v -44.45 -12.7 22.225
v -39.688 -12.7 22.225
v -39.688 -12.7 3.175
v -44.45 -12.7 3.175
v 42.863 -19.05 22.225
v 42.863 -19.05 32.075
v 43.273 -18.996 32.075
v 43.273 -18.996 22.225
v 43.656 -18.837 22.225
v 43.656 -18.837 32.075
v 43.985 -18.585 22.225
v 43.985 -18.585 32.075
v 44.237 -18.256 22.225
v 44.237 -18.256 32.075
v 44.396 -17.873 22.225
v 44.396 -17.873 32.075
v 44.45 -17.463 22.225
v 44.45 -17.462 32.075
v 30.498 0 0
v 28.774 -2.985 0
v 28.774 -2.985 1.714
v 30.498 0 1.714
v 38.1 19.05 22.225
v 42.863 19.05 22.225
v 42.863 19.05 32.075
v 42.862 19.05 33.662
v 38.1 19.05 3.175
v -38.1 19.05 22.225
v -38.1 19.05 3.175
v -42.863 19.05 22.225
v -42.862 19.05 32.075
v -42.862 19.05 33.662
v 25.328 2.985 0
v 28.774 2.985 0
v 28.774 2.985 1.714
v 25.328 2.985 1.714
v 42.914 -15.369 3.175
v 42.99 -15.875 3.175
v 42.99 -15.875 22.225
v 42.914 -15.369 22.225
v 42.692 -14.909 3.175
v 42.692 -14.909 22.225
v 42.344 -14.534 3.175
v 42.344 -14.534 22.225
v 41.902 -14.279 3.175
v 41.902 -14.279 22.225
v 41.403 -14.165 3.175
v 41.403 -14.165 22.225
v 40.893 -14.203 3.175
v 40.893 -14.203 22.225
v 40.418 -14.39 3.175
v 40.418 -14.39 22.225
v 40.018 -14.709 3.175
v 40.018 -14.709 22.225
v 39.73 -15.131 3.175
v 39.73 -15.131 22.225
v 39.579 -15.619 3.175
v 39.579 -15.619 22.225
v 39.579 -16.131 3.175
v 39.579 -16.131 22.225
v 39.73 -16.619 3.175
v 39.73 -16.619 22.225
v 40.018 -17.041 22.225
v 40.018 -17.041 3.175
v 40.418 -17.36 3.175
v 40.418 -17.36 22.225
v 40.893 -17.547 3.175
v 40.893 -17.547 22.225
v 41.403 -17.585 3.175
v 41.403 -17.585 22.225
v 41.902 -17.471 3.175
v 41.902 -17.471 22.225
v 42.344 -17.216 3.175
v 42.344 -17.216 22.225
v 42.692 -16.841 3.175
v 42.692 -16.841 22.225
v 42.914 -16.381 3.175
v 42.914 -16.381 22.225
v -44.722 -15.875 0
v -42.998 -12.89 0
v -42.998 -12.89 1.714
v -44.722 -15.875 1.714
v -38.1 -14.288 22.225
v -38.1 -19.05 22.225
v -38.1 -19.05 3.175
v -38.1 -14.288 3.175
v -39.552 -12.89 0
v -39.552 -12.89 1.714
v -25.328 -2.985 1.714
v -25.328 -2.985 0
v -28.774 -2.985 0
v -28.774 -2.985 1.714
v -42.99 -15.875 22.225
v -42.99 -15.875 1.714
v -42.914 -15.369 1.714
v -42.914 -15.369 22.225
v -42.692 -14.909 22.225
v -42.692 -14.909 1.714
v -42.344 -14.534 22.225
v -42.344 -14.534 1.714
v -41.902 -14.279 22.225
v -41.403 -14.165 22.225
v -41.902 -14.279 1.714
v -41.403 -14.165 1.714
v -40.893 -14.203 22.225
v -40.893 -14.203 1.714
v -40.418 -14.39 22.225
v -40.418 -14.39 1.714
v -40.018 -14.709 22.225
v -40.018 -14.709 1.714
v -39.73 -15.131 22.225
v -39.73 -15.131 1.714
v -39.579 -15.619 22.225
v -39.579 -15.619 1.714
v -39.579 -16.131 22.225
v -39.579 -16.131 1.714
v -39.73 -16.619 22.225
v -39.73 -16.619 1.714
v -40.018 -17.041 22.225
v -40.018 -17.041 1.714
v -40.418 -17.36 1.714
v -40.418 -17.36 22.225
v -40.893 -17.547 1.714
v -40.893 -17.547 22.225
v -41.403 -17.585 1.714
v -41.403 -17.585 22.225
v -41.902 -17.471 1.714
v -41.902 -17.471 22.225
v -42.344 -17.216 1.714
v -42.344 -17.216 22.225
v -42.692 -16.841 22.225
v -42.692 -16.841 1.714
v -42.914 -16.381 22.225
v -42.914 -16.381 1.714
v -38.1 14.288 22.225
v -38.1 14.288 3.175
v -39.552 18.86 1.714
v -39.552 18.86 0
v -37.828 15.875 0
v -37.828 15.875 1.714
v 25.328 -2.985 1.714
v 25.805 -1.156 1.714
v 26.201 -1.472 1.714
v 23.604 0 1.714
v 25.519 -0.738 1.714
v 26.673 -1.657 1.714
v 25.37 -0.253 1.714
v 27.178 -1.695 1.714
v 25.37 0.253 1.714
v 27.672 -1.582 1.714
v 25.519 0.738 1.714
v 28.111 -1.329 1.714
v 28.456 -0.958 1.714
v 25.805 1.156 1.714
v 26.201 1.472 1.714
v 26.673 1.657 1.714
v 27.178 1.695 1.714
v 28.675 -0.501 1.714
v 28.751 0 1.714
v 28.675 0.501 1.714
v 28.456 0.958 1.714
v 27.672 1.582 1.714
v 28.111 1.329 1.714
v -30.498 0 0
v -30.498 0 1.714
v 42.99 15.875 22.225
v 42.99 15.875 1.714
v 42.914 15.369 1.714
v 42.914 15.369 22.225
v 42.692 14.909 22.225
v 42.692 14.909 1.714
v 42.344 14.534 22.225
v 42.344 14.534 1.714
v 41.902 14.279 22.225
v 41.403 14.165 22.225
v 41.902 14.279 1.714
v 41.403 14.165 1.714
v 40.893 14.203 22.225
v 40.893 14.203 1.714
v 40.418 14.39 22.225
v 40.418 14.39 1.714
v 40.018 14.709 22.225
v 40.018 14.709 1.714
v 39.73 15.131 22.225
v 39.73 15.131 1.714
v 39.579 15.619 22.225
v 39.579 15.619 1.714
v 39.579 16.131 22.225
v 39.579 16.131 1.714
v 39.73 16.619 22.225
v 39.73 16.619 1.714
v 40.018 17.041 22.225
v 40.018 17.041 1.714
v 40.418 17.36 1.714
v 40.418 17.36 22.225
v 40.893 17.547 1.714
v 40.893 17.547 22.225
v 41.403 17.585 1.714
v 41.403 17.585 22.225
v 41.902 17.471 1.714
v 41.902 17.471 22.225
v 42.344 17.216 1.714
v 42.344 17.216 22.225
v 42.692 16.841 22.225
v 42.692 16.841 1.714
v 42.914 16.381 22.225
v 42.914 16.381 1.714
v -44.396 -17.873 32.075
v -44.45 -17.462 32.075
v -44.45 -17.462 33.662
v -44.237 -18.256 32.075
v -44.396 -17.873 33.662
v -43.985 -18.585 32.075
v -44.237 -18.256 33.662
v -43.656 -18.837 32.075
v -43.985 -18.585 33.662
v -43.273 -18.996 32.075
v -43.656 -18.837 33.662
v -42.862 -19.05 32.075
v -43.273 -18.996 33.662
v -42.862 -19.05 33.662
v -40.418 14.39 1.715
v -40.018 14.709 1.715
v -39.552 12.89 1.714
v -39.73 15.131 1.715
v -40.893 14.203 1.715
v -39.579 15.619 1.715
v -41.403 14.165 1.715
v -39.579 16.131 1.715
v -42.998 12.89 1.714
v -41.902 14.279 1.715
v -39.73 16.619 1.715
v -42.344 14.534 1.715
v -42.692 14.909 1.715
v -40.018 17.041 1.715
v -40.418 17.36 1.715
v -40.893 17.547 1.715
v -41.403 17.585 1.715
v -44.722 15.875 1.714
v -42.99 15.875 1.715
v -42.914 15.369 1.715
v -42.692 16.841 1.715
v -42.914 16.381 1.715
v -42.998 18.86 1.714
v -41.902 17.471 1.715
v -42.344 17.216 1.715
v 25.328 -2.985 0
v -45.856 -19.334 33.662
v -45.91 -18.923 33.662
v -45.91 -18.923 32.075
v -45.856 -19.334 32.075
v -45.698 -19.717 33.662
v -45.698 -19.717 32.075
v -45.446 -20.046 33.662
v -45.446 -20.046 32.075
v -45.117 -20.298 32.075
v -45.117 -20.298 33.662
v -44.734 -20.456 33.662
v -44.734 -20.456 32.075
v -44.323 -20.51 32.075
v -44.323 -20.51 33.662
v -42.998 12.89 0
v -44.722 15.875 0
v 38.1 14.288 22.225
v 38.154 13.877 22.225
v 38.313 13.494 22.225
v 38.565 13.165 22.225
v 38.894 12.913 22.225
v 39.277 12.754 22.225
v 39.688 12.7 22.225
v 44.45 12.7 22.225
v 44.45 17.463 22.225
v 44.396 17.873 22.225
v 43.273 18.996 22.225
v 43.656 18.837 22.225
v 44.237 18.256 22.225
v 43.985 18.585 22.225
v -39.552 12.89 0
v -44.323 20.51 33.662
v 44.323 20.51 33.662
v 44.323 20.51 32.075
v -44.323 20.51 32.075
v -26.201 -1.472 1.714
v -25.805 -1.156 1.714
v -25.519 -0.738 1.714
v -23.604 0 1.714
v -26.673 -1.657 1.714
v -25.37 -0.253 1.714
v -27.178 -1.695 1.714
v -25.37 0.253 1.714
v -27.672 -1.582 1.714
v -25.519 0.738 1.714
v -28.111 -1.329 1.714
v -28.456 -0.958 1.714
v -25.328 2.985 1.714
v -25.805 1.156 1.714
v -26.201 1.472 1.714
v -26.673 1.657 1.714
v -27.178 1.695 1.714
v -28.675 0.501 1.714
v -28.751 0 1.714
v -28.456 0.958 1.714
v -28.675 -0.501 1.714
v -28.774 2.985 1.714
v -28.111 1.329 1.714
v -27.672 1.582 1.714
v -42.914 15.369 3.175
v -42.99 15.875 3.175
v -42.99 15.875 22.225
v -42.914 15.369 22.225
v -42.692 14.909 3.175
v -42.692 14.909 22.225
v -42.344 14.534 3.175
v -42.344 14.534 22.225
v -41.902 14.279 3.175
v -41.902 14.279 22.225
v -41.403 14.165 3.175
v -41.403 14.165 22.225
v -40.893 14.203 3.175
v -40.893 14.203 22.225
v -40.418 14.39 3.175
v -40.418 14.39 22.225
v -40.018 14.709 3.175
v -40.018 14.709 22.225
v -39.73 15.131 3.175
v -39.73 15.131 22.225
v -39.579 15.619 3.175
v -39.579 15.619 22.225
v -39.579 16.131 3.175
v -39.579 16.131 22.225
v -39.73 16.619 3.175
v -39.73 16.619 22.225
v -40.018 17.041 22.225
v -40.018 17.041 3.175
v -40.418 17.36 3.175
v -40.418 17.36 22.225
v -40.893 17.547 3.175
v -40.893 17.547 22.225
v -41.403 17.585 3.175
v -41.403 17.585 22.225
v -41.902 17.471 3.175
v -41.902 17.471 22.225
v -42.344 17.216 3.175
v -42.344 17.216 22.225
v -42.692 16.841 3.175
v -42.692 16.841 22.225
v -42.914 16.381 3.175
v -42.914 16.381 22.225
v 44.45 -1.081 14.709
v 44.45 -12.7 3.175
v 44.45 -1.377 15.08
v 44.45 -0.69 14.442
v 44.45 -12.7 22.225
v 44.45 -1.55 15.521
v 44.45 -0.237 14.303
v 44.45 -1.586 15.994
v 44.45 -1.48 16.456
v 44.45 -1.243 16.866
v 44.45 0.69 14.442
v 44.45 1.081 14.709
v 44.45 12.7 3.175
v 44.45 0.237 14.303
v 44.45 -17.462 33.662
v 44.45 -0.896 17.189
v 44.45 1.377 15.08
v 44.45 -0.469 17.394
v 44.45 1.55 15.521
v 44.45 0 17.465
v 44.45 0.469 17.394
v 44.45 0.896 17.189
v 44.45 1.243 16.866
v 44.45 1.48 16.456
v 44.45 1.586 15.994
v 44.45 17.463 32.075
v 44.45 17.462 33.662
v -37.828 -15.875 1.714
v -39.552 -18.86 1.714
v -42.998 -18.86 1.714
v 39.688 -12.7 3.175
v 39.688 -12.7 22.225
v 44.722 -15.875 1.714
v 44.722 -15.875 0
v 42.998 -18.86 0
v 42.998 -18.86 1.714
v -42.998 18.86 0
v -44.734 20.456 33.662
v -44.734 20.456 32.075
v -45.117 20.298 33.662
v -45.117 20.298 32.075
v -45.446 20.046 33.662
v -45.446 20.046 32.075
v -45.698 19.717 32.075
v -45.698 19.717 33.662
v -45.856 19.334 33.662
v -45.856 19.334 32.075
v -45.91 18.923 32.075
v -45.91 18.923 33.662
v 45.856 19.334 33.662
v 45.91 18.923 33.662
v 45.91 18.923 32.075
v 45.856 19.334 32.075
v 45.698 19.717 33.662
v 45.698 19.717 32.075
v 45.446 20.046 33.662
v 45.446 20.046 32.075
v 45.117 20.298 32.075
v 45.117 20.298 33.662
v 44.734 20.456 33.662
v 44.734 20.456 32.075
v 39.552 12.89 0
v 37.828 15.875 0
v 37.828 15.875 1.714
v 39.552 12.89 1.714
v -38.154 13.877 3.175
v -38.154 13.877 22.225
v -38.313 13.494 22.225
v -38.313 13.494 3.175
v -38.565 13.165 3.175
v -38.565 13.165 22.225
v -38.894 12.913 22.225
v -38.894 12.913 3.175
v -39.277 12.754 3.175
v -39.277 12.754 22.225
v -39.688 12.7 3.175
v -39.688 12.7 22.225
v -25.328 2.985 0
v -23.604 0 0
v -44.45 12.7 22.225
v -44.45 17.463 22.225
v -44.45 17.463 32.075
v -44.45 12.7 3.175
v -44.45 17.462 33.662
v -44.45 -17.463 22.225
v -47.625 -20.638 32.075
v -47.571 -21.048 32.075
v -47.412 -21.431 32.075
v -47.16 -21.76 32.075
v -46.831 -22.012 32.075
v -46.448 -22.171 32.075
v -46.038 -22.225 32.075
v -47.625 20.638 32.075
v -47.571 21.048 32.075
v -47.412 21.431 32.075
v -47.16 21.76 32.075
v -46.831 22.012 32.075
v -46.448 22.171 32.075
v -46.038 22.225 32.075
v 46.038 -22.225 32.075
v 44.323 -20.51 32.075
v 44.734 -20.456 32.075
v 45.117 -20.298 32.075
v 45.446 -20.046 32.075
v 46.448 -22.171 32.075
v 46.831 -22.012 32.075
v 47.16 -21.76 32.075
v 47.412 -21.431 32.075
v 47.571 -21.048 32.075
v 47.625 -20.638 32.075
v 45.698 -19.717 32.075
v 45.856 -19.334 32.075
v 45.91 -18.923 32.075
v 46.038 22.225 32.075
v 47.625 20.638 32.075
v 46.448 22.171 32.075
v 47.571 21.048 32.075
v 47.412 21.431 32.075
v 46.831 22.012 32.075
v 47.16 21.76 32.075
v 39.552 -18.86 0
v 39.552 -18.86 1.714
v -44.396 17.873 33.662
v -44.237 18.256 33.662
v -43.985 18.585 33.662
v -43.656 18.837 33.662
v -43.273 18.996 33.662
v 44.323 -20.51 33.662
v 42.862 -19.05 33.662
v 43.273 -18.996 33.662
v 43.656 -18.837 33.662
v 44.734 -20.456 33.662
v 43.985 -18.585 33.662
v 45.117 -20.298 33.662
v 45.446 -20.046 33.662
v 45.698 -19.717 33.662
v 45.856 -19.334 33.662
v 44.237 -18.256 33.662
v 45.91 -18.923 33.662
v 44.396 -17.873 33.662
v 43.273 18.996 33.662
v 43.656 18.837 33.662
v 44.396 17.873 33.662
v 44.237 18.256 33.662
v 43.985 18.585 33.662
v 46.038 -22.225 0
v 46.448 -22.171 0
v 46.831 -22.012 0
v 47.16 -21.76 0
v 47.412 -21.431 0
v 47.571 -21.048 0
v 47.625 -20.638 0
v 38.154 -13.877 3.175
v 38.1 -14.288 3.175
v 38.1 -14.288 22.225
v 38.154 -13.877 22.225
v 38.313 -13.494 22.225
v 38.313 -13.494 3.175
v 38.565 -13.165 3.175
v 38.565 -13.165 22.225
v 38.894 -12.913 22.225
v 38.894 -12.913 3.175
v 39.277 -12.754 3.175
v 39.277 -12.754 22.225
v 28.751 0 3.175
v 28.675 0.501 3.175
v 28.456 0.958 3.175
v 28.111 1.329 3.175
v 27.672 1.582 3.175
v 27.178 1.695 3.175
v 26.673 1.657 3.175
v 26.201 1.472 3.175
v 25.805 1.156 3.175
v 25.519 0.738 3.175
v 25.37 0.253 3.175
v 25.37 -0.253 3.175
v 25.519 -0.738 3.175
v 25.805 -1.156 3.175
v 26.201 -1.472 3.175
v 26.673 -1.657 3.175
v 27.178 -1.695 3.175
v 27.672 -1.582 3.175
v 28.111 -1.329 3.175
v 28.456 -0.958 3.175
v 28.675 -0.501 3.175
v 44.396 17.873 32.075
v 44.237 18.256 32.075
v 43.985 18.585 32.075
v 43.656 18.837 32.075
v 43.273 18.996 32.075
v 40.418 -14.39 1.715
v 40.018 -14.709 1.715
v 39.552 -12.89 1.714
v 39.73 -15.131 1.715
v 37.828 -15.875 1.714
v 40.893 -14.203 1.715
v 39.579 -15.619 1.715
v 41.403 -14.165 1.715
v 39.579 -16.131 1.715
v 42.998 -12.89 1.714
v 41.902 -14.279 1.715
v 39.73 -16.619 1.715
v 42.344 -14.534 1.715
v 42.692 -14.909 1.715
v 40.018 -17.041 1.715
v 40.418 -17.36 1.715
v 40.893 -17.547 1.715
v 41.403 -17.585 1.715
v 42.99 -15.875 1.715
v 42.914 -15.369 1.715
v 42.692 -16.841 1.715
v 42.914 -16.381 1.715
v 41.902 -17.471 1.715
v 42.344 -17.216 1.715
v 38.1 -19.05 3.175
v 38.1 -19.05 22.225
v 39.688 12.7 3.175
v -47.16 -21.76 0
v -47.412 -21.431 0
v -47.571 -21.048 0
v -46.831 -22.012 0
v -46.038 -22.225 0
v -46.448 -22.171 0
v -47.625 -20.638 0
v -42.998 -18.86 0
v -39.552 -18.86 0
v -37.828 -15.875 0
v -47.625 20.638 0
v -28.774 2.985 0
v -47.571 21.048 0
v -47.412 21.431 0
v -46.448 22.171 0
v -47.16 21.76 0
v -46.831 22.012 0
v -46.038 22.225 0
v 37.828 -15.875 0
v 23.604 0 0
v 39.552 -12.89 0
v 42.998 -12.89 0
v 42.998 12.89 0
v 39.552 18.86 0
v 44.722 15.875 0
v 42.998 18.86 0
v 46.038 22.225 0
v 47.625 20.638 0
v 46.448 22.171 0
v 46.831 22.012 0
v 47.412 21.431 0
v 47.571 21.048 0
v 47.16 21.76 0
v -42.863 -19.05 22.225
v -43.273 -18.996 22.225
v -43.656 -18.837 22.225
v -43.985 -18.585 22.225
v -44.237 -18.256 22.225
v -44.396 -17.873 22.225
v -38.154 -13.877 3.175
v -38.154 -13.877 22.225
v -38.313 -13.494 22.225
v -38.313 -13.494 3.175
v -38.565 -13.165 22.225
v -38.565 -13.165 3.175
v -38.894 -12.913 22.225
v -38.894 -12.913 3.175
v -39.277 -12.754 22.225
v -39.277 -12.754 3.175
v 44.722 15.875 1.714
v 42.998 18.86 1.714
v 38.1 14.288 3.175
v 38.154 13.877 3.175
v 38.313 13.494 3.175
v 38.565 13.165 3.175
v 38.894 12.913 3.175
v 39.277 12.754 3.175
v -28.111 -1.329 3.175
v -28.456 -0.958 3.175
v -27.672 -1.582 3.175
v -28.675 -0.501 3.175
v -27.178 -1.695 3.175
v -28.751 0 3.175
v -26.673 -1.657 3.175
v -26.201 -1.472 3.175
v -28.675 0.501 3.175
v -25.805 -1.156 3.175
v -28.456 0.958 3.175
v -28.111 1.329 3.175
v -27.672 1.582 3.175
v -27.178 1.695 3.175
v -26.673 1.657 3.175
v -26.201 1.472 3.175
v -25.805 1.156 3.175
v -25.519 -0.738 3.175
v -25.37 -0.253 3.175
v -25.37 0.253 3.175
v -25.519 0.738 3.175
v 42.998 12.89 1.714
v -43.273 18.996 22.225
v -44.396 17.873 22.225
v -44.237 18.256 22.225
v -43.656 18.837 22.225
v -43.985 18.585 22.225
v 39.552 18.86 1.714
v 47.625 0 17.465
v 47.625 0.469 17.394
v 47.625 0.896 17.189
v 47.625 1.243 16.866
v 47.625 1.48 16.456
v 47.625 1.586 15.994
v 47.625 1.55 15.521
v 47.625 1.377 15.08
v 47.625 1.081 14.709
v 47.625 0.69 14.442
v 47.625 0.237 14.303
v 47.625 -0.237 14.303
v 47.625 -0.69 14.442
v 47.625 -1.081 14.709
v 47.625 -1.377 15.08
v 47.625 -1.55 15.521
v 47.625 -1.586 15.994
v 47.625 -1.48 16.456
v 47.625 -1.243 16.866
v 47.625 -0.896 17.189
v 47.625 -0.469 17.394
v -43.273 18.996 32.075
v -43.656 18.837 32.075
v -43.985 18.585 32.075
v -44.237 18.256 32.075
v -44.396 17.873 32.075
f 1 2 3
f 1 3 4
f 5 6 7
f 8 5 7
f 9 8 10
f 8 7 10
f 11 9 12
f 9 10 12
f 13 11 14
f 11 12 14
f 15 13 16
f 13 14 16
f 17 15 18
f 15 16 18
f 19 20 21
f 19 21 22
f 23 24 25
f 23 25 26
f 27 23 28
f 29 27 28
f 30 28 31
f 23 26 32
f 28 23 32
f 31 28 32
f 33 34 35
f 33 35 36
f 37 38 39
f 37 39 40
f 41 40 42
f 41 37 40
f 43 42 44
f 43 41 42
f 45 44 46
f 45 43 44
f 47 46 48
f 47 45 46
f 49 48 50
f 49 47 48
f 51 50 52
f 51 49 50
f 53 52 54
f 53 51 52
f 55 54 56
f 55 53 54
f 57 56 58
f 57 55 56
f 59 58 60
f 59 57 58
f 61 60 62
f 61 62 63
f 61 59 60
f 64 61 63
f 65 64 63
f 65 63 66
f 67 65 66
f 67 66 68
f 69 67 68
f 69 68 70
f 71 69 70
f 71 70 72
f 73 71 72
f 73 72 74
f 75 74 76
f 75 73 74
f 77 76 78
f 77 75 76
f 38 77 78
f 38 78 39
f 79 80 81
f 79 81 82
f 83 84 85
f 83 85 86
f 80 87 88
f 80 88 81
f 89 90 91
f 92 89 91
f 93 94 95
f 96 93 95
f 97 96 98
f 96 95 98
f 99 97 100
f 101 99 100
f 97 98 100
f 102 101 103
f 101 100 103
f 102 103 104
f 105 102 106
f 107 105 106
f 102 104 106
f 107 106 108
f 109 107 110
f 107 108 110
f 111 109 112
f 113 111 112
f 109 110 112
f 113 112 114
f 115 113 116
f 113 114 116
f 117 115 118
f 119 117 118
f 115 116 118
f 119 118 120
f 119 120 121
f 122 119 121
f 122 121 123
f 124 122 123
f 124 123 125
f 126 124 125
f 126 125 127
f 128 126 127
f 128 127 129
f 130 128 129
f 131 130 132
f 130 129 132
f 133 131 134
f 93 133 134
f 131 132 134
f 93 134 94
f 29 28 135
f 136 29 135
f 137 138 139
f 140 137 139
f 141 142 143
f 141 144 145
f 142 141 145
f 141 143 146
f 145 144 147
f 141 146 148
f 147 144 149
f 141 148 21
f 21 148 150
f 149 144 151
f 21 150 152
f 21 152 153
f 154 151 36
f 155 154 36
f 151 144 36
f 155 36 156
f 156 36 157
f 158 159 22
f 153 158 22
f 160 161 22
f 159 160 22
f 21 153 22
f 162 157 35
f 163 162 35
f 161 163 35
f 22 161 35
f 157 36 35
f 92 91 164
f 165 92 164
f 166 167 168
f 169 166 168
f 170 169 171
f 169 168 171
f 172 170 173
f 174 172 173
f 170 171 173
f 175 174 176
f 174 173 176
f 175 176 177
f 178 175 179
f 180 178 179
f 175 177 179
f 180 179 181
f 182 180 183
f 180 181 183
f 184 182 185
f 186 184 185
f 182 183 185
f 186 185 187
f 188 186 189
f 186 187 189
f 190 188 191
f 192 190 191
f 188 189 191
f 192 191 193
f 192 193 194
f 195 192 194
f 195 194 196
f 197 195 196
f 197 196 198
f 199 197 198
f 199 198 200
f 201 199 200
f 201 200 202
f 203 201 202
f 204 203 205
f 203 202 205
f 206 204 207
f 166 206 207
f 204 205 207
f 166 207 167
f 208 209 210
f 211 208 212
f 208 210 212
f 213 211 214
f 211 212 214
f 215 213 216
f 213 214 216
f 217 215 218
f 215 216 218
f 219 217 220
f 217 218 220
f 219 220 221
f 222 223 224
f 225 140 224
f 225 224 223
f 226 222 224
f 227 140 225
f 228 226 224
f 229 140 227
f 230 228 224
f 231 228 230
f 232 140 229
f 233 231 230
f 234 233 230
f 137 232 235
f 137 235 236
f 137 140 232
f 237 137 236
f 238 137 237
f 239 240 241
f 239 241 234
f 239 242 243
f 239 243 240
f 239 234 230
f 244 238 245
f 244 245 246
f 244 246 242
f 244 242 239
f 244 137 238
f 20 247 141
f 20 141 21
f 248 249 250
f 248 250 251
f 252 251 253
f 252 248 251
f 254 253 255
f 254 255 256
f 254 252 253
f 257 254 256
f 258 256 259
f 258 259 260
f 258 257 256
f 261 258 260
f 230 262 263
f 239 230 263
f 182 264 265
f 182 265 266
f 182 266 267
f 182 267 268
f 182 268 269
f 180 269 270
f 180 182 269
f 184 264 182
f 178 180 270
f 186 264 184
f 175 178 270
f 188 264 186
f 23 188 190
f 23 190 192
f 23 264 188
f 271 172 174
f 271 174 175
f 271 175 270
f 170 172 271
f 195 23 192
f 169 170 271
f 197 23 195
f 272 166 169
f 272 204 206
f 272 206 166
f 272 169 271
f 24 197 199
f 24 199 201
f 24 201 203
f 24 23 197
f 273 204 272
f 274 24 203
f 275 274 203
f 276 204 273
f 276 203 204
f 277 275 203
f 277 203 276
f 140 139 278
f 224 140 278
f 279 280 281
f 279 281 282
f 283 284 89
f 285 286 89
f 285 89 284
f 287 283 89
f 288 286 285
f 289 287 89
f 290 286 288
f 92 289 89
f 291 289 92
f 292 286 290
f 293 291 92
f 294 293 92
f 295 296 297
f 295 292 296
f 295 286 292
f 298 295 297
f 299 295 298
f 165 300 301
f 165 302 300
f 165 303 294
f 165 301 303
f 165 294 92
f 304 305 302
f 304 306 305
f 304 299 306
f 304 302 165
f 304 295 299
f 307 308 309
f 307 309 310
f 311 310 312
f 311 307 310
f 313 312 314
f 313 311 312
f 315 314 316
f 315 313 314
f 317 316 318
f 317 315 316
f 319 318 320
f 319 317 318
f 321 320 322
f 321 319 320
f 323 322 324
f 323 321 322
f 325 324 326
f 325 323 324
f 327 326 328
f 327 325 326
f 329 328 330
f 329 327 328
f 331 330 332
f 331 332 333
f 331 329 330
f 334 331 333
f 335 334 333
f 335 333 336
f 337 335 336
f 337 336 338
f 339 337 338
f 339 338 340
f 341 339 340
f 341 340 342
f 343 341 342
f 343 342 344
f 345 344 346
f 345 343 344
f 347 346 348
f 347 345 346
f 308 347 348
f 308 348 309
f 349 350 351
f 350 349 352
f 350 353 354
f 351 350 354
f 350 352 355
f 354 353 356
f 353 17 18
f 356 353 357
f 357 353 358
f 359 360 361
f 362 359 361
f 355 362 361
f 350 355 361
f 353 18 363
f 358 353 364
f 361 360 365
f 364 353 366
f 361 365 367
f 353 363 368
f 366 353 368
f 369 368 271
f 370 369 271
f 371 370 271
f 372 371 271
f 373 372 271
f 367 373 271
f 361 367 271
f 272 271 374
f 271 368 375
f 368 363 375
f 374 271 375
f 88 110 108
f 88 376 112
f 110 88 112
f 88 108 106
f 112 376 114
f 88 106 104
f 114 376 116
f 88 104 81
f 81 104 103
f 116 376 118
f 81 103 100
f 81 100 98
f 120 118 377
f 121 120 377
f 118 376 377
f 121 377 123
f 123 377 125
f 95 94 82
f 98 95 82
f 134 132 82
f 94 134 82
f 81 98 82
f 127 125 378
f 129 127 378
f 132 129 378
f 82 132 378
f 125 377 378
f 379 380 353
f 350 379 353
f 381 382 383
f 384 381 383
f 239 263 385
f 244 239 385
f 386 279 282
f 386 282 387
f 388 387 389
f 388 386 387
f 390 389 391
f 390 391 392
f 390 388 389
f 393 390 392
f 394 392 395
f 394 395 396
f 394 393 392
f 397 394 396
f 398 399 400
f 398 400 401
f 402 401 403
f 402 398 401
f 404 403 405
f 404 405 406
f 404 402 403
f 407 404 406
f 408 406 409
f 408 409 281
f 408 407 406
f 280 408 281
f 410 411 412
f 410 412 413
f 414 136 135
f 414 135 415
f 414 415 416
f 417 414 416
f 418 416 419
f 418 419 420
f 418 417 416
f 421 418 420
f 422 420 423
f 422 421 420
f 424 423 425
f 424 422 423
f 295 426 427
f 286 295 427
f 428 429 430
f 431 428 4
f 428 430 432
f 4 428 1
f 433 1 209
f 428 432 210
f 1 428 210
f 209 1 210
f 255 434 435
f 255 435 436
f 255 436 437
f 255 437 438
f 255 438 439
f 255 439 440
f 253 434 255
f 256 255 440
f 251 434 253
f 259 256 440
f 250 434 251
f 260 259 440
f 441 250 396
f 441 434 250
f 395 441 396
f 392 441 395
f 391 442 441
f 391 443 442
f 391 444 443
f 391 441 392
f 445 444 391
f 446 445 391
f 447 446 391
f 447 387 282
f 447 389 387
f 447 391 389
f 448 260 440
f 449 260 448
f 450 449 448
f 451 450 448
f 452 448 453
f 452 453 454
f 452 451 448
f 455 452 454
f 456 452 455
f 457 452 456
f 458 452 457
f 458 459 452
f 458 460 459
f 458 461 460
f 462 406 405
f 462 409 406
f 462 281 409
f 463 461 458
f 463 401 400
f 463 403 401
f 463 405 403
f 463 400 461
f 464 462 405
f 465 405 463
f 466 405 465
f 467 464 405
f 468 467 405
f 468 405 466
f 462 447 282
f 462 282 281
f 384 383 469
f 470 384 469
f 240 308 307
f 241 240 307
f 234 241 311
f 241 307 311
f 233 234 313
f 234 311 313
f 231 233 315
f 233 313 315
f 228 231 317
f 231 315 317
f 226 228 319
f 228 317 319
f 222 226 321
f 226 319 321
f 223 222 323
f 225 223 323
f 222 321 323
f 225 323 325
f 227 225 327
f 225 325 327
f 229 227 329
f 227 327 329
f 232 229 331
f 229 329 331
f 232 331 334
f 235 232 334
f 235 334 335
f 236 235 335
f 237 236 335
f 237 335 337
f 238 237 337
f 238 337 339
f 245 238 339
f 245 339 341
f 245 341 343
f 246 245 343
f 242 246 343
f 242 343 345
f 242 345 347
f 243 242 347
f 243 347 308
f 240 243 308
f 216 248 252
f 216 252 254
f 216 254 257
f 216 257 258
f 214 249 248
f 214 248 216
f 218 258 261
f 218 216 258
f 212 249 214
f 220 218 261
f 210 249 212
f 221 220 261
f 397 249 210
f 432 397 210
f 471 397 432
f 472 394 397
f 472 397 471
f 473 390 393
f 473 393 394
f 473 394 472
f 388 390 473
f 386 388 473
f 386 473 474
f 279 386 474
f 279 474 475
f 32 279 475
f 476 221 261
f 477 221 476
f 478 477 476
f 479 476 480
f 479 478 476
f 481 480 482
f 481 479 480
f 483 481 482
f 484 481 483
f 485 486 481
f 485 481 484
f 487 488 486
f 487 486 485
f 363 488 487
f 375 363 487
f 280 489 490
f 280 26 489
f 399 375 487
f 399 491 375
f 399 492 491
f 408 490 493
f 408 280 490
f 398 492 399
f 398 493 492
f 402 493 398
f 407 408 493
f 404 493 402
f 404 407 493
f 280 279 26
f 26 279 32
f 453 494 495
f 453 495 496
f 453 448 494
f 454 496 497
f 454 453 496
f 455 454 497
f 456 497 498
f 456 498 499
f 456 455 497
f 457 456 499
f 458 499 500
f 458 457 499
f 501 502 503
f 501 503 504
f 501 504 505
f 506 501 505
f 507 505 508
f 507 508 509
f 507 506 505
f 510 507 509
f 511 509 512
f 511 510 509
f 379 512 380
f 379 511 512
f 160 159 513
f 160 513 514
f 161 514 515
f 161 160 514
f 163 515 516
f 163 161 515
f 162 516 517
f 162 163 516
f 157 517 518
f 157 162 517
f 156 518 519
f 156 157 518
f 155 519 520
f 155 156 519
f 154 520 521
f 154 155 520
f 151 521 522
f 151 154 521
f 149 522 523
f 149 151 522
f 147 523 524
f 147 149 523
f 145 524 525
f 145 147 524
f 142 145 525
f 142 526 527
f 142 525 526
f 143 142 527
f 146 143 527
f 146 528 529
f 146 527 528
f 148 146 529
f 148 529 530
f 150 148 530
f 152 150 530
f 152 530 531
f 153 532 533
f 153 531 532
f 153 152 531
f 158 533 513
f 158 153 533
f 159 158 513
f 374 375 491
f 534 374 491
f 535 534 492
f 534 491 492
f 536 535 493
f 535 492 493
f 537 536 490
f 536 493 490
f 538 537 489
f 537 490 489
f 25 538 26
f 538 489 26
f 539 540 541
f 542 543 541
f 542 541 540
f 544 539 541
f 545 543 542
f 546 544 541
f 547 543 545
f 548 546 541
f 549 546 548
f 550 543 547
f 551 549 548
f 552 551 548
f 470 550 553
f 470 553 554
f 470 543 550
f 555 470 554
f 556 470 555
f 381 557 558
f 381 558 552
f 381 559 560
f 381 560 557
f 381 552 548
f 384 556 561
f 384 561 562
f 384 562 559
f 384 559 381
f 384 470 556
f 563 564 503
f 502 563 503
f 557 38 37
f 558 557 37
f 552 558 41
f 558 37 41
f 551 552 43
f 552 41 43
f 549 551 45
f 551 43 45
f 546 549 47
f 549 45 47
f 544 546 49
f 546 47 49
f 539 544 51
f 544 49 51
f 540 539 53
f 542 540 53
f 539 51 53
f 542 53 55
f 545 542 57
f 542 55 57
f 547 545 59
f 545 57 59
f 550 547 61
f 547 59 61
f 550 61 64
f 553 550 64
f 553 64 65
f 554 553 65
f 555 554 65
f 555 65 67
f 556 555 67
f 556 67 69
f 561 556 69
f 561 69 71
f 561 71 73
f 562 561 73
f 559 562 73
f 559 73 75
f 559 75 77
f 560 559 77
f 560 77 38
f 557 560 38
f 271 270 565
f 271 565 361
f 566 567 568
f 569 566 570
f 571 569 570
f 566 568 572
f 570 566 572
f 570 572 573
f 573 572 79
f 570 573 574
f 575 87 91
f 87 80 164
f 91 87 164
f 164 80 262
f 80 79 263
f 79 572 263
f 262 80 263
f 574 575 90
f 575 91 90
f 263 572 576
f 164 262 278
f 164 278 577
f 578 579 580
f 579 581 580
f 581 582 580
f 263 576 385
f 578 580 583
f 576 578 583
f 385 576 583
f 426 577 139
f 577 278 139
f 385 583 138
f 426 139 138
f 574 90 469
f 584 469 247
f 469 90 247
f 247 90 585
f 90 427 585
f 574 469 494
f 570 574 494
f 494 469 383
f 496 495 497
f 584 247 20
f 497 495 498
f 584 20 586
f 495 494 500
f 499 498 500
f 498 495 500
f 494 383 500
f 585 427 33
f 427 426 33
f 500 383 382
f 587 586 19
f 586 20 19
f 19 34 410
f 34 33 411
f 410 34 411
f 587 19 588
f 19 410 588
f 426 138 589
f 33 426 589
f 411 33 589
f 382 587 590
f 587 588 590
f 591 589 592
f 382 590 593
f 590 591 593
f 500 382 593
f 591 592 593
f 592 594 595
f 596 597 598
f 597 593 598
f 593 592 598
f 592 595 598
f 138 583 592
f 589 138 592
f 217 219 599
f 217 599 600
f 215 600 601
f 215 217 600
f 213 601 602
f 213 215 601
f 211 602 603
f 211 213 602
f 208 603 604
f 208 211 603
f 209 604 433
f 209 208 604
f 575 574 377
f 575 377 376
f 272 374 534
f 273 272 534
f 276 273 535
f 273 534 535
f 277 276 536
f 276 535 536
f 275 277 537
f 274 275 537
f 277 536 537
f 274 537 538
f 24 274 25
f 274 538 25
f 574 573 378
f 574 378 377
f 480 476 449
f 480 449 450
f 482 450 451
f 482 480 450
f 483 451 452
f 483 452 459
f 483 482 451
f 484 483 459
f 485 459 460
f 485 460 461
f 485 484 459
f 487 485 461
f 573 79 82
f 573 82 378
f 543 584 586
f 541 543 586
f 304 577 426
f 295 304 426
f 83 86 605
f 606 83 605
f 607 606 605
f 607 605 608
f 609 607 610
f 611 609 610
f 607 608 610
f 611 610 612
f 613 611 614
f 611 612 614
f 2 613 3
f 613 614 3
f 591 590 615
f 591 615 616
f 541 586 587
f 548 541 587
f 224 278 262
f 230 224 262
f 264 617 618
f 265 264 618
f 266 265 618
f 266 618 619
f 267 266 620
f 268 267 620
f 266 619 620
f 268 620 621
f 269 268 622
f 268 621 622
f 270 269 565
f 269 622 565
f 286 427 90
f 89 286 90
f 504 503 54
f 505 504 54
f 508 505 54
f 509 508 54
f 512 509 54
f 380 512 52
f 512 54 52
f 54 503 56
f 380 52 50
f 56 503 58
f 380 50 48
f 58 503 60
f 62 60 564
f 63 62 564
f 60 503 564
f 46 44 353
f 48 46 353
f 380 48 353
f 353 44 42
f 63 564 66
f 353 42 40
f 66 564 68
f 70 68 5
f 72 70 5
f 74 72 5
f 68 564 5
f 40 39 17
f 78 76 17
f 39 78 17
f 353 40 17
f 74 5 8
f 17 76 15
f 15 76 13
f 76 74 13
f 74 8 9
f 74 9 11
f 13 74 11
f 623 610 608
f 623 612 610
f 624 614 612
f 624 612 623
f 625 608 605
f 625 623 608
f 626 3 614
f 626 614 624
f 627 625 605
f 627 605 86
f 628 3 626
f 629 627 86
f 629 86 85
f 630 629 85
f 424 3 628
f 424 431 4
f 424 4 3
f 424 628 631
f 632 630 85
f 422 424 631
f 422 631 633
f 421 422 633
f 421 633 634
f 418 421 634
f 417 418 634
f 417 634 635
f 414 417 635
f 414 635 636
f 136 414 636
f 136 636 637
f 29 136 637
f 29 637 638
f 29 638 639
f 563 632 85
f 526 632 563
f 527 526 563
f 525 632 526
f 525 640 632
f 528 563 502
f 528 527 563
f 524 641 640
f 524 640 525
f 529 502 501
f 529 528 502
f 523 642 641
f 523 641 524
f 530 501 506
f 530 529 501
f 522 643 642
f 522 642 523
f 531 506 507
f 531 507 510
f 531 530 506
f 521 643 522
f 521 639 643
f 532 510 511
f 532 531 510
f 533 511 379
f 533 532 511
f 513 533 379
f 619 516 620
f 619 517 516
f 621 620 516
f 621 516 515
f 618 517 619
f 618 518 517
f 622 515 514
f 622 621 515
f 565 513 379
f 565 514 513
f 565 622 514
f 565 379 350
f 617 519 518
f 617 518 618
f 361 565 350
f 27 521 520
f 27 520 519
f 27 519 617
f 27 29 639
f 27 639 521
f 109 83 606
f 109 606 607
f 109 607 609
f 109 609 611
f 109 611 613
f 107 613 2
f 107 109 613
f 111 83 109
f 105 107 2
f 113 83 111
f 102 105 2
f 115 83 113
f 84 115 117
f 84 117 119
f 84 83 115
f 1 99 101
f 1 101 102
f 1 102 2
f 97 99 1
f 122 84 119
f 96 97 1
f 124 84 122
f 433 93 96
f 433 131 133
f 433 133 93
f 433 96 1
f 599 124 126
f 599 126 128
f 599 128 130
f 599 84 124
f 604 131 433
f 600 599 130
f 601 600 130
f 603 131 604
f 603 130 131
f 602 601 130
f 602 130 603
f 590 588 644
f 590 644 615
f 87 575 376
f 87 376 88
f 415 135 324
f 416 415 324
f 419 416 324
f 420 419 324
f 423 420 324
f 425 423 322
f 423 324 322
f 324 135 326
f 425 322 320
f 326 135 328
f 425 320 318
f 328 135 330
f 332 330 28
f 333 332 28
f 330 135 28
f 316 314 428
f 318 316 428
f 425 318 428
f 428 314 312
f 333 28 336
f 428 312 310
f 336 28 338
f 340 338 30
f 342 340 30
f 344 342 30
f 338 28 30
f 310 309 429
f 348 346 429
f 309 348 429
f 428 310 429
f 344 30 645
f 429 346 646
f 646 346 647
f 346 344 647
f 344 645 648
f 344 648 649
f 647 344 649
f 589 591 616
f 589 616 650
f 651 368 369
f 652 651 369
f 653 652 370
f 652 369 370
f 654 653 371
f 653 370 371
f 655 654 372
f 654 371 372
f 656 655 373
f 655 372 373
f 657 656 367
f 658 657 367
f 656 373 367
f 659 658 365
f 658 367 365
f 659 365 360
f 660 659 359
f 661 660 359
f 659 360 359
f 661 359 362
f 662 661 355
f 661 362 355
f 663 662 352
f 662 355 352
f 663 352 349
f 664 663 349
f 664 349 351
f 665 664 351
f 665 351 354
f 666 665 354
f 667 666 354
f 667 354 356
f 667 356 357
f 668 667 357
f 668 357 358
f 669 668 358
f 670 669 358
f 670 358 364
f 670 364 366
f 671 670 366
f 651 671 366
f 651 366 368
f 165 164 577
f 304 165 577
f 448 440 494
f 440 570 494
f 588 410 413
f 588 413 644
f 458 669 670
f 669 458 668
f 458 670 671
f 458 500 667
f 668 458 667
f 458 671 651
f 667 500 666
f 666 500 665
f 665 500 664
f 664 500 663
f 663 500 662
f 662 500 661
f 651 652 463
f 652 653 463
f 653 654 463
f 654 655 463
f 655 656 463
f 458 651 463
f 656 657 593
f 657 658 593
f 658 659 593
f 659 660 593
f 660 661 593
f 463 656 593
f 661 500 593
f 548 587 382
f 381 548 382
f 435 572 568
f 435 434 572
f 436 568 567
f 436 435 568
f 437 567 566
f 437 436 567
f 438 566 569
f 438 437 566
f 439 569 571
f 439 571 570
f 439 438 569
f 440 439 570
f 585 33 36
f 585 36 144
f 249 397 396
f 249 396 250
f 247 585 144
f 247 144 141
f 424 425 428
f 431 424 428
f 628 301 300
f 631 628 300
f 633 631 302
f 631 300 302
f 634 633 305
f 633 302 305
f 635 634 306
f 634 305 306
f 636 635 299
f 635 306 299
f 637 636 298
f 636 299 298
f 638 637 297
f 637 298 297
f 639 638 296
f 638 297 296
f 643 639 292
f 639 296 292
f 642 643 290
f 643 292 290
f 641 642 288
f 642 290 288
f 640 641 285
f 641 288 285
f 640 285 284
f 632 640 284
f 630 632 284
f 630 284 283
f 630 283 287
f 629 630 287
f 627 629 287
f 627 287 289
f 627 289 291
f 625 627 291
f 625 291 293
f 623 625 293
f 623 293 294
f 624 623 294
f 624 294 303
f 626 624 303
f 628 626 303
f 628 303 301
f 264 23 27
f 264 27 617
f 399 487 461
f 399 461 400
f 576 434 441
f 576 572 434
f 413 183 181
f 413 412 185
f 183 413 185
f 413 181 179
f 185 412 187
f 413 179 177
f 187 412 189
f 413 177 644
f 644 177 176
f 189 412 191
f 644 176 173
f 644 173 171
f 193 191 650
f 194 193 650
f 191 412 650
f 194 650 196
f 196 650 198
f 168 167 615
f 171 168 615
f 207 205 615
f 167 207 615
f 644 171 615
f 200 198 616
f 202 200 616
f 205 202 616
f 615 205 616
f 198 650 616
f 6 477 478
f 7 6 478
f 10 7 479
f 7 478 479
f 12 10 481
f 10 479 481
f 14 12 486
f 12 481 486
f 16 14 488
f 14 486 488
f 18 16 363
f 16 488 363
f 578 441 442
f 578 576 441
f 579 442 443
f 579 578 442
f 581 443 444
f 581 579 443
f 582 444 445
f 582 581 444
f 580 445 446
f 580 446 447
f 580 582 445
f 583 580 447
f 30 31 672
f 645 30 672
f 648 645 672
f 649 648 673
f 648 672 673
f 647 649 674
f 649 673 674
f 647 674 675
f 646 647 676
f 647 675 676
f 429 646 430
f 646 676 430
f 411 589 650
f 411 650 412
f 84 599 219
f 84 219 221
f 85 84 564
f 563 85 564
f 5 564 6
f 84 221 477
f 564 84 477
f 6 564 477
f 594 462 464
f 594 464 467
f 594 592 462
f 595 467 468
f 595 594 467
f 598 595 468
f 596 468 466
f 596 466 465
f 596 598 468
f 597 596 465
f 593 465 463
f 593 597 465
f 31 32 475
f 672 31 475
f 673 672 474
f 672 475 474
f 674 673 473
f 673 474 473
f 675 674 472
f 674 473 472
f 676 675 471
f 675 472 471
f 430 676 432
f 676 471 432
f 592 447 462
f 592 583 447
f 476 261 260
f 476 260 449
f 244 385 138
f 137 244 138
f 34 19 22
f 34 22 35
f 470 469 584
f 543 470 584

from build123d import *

# Parameters (mm, degrees)
SKETCH1_W                                  = 95.25
SKETCH1_H                                  = 44.45
BOSS_EXTRUDE1_DEPTH                        = 3.175
SKETCH2_W                                  = 95.25
SKETCH2_H                                  = 44.45
SKETCH2_W_2                                = 88.9
SKETCH2_H_2                                = 38.1
BOSS_EXTRUDE2_DEPTH                        = 28.9
SKETCH3_R                                  = 1.7
CUT_EXTRUDE1_DEPTH                         = 62.570259663
CUT_EXTRUDE2_DEPTH                         = 1.7145
FILLET1_R                                  = 1.5875
BOSS_EXTRUDE3_START                        = 1.5875
BOSS_EXTRUDE3_DEPTH                        = 1.5875
SKETCH6_R                                  = 1.715
BOSS_EXTRUDE4_DEPTH                        = 19.05
SKETCH7_R                                  = 1.715
CUT_EXTRUDE3_DEPTH                         = 58.061737399
CUT_EXTRUDE4_DEPTH                         = 1.7145
MIRROR3_AT_THE_SECOND_PLANE_COPY_1_SKETC_R = 1.715
MIRROR3_AT_THE_SECOND_PLANE_COPY_1_DEPTH   = 19.05
MIRROR3_AT_THE_SECOND_PLANE_COPY_2_SKETC_R = 1.715
MIRROR3_AT_THE_SECOND_PLANE_COPY_2_DEPTH   = 58.061737399
MIRROR3_AT_THE_SECOND_PLANE_COPY_3_DEPTH   = 1.7145
SKETCH9_R                                  = 1.59
CUT_EXTRUDE5_DEPTH                         = 101.523231923


with BuildPart() as part:
    # Sketch1 → Boss-Extrude1 (new body)
    with BuildSketch(Plane.XY):
        Rectangle(SKETCH1_W, SKETCH1_H)
    extrude(amount=BOSS_EXTRUDE1_DEPTH)

    # Sketch2 → Boss-Extrude2 (add)
    with BuildSketch(Plane.XY.offset(3.175)):
        Rectangle(SKETCH2_W, SKETCH2_H)
        Rectangle(SKETCH2_W_2, SKETCH2_H_2, mode=Mode.SUBTRACT)
    extrude(amount=BOSS_EXTRUDE2_DEPTH)

    # Sketch3 → Cut-Extrude1 (cut, through all)
    with BuildSketch(Plane(origin=(0, 0, 0), x_dir=(-1, 0, 0), z_dir=(0, 0, -1))):
        with Locations((27.051, 0)):
            Circle(SKETCH3_R)
    cut_extrude1 = extrude(amount=-CUT_EXTRUDE1_DEPTH, mode=Mode.SUBTRACT)

    # Mirror1: Cut-Extrude1 across plane
    add(cut_extrude1.mirror(Plane(origin=(0, 0, 0), x_dir=(0, 0, 1), z_dir=(1, 0, 0))), mode=Mode.SUBTRACT)

    # Sketch4 → Cut-Extrude2 (cut)
    with BuildSketch(Plane(origin=(0, 0, 0), x_dir=(-1, 0, 0), z_dir=(0, 0, -1))):
        Polygon((30.497781106, 0), (28.774390553, 2.984999999), (25.327609447, 2.984999999), (23.604218894, 0), (25.327609447, -2.984999999), (28.774390553, -2.984999999), align=None)
    cut_extrude2 = extrude(amount=-CUT_EXTRUDE2_DEPTH, mode=Mode.SUBTRACT)

    # Mirror2: Cut-Extrude2 across plane
    add(cut_extrude2.mirror(Plane(origin=(0, 0, 0), x_dir=(0, 0, 1), z_dir=(1, 0, 0))), mode=Mode.SUBTRACT)

    # Fillet1
    fillet1_edges = [part.edges().sort_by_distance(p)[0] for p in [
        (44.45, 19.05, 17.625),
        (-44.45, 19.05, 17.625),
        (-44.45, -19.05, 17.625),
        (44.45, -19.05, 17.625),
        (47.625, -22.225, 16.0375),
        (-47.625, -22.225, 16.0375),
        (-47.625, 22.225, 16.0375),
        (47.625, 22.225, 16.0375),
    ]]
    fillet(fillet1_edges, radius=FILLET1_R)

    # Sketch5 → Boss-Extrude3 (add)
    with BuildSketch(Plane.XY.offset(32.075).offset(BOSS_EXTRUDE3_START)):
        with BuildLine():
            Line((-44.323, -20.5105), (44.323, -20.5105))
            ThreePointArc((44.323, -20.5105), (45.445532015, -20.045532015), (45.9105, -18.923))
            Line((45.9105, -18.923), (45.9105, 18.923))
            ThreePointArc((45.9105, 18.923), (45.445532015, 20.045532015), (44.323, 20.5105))
            Line((44.323, 20.5105), (-44.323, 20.5105))
            ThreePointArc((-44.323, 20.5105), (-45.445532015, 20.045532015), (-45.9105, 18.923))
            Line((-45.9105, 18.923), (-45.9105, -18.923))
            ThreePointArc((-45.9105, -18.923), (-45.445532015, -20.045532015), (-44.323, -20.5105))
        make_face()
        with BuildLine():
            Line((44.45, -17.4625), (44.45, 17.4625))
            ThreePointArc((44.45, 17.4625), (43.985032015, 18.585032015), (42.8625, 19.05))
            Line((42.8625, 19.05), (-42.8625, 19.05))
            ThreePointArc((-42.8625, 19.05), (-43.985032015, 18.585032015), (-44.45, 17.4625))
            Line((-44.45, 17.4625), (-44.45, -17.4625))
            ThreePointArc((-44.45, -17.4625), (-43.985032015, -18.585032015), (-42.8625, -19.05))
            Line((-42.8625, -19.05), (42.8625, -19.05))
            ThreePointArc((42.8625, -19.05), (43.985032015, -18.585032015), (44.45, -17.4625))
        make_face(mode=Mode.SUBTRACT)
    extrude(amount=-BOSS_EXTRUDE3_DEPTH)

    # Sketch6 → Boss-Extrude4 (add)
    with BuildSketch(Plane.XY.offset(3.175)):
        with BuildLine():
            Line((-44.45, 19.05), (-38.1, 19.05))
            Line((-38.1, 19.05), (-38.1, 14.2875))
            ThreePointArc((-38.1, 14.2875), (-38.564967985, 13.164967985), (-39.6875, 12.7))
            Line((-39.6875, 12.7), (-44.45, 12.7))
            Line((-44.45, 12.7), (-44.45, 19.05))
        make_face()
        with Locations(Location((-41.275, 15.875, 0), (0, 0, 180))):
            Circle(SKETCH6_R, mode=Mode.SUBTRACT)
    boss_extrude4 = extrude(amount=BOSS_EXTRUDE4_DEPTH)

    # Sketch7 → Cut-Extrude3 (cut, through all)
    with BuildSketch(Plane.XY.offset(22.225)):
        with Locations(Location((-41.275, 15.875, 0), (0, 0, 180))):
            Circle(SKETCH7_R)
    cut_extrude3 = extrude(amount=-CUT_EXTRUDE3_DEPTH, mode=Mode.SUBTRACT)

    # Sketch8 → Cut-Extrude4 (cut)
    with BuildSketch(Plane(origin=(0, 0, 0), x_dir=(-1, 0, 0), z_dir=(0, 0, -1))):
        Polygon((37.828218893, 15.875), (39.551609446, 12.89), (42.998390554, 12.89), (44.721781107, 15.875), (42.998390554, 18.86), (39.551609446, 18.86), align=None)
    cut_extrude4 = extrude(amount=-CUT_EXTRUDE4_DEPTH, mode=Mode.SUBTRACT)

    # Mirror3: Boss-Extrude4, Cut-Extrude3, Cut-Extrude4 across plane
    add(boss_extrude4.mirror(Plane(origin=(0, 0, 0), x_dir=(0, 0, 1), z_dir=(1, 0, 0))))
    add(cut_extrude3.mirror(Plane(origin=(0, 0, 0), x_dir=(0, 0, 1), z_dir=(1, 0, 0))), mode=Mode.SUBTRACT)
    add(cut_extrude4.mirror(Plane(origin=(0, 0, 0), x_dir=(0, 0, 1), z_dir=(1, 0, 0))), mode=Mode.SUBTRACT)

    # Mirror3 at the second plane: Boss-Extrude4, Cut-Extrude3, Cut-Extrude4 across plane
    add(boss_extrude4.mirror(Plane.ZX))
    add(cut_extrude3.mirror(Plane.ZX), mode=Mode.SUBTRACT)
    add(cut_extrude4.mirror(Plane.ZX), mode=Mode.SUBTRACT)

    # Mirror3 at the second plane copy 1 sketc → Mirror3 at the second plane copy 1 (add)
    with BuildSketch(Plane(origin=(0, 0, 3.175), x_dir=(-1, 0, 0), z_dir=(0, 0, 1))):
        with BuildLine():
            Line((-44.45, 19.05), (-38.1, 19.05))
            Line((-38.1, 19.05), (-38.1, 14.2875))
            ThreePointArc((-38.1, 14.2875), (-38.564967985, 13.164967985), (-39.6875, 12.7))
            Line((-39.6875, 12.7), (-44.45, 12.7))
            Line((-44.45, 12.7), (-44.45, 19.05))
        make_face()
        with Locations(Location((-41.275, 15.875, 0), (0, 0, 180))):
            Circle(MIRROR3_AT_THE_SECOND_PLANE_COPY_1_SKETC_R, mode=Mode.SUBTRACT)
    extrude(amount=MIRROR3_AT_THE_SECOND_PLANE_COPY_1_DEPTH)

    # Mirror3 at the second plane copy 2 sketc → Mirror3 at the second plane copy 2 (cut, through all)
    with BuildSketch(Plane(origin=(0, 0, 22.225), x_dir=(-1, 0, 0), z_dir=(0, 0, 1))):
        with Locations(Location((-41.275, 15.875, 0), (0, 0, 180))):
            Circle(MIRROR3_AT_THE_SECOND_PLANE_COPY_2_SKETC_R)
    extrude(amount=-MIRROR3_AT_THE_SECOND_PLANE_COPY_2_DEPTH, mode=Mode.SUBTRACT)

    # Mirror3 at the second plane copy 3 sketc → Mirror3 at the second plane copy 3 (cut)
    with BuildSketch(Plane(origin=(0, 0, 0), x_dir=(1, 0, 0), z_dir=(0, 0, -1))):
        Polygon((37.828218893, 15.875), (39.551609446, 12.89), (42.998390554, 12.89), (44.721781107, 15.875), (42.998390554, 18.86), (39.551609446, 18.86), align=None)
    extrude(amount=-MIRROR3_AT_THE_SECOND_PLANE_COPY_3_DEPTH, mode=Mode.SUBTRACT)

    # Sketch9 → Cut-Extrude5 (cut, through all)
    with BuildSketch(Plane.ZY.offset(-44.45)):
        with Locations((15.875, 0)):
            Circle(SKETCH9_R)
    extrude(amount=-CUT_EXTRUDE5_DEPTH, mode=Mode.SUBTRACT)


solid = part.part
